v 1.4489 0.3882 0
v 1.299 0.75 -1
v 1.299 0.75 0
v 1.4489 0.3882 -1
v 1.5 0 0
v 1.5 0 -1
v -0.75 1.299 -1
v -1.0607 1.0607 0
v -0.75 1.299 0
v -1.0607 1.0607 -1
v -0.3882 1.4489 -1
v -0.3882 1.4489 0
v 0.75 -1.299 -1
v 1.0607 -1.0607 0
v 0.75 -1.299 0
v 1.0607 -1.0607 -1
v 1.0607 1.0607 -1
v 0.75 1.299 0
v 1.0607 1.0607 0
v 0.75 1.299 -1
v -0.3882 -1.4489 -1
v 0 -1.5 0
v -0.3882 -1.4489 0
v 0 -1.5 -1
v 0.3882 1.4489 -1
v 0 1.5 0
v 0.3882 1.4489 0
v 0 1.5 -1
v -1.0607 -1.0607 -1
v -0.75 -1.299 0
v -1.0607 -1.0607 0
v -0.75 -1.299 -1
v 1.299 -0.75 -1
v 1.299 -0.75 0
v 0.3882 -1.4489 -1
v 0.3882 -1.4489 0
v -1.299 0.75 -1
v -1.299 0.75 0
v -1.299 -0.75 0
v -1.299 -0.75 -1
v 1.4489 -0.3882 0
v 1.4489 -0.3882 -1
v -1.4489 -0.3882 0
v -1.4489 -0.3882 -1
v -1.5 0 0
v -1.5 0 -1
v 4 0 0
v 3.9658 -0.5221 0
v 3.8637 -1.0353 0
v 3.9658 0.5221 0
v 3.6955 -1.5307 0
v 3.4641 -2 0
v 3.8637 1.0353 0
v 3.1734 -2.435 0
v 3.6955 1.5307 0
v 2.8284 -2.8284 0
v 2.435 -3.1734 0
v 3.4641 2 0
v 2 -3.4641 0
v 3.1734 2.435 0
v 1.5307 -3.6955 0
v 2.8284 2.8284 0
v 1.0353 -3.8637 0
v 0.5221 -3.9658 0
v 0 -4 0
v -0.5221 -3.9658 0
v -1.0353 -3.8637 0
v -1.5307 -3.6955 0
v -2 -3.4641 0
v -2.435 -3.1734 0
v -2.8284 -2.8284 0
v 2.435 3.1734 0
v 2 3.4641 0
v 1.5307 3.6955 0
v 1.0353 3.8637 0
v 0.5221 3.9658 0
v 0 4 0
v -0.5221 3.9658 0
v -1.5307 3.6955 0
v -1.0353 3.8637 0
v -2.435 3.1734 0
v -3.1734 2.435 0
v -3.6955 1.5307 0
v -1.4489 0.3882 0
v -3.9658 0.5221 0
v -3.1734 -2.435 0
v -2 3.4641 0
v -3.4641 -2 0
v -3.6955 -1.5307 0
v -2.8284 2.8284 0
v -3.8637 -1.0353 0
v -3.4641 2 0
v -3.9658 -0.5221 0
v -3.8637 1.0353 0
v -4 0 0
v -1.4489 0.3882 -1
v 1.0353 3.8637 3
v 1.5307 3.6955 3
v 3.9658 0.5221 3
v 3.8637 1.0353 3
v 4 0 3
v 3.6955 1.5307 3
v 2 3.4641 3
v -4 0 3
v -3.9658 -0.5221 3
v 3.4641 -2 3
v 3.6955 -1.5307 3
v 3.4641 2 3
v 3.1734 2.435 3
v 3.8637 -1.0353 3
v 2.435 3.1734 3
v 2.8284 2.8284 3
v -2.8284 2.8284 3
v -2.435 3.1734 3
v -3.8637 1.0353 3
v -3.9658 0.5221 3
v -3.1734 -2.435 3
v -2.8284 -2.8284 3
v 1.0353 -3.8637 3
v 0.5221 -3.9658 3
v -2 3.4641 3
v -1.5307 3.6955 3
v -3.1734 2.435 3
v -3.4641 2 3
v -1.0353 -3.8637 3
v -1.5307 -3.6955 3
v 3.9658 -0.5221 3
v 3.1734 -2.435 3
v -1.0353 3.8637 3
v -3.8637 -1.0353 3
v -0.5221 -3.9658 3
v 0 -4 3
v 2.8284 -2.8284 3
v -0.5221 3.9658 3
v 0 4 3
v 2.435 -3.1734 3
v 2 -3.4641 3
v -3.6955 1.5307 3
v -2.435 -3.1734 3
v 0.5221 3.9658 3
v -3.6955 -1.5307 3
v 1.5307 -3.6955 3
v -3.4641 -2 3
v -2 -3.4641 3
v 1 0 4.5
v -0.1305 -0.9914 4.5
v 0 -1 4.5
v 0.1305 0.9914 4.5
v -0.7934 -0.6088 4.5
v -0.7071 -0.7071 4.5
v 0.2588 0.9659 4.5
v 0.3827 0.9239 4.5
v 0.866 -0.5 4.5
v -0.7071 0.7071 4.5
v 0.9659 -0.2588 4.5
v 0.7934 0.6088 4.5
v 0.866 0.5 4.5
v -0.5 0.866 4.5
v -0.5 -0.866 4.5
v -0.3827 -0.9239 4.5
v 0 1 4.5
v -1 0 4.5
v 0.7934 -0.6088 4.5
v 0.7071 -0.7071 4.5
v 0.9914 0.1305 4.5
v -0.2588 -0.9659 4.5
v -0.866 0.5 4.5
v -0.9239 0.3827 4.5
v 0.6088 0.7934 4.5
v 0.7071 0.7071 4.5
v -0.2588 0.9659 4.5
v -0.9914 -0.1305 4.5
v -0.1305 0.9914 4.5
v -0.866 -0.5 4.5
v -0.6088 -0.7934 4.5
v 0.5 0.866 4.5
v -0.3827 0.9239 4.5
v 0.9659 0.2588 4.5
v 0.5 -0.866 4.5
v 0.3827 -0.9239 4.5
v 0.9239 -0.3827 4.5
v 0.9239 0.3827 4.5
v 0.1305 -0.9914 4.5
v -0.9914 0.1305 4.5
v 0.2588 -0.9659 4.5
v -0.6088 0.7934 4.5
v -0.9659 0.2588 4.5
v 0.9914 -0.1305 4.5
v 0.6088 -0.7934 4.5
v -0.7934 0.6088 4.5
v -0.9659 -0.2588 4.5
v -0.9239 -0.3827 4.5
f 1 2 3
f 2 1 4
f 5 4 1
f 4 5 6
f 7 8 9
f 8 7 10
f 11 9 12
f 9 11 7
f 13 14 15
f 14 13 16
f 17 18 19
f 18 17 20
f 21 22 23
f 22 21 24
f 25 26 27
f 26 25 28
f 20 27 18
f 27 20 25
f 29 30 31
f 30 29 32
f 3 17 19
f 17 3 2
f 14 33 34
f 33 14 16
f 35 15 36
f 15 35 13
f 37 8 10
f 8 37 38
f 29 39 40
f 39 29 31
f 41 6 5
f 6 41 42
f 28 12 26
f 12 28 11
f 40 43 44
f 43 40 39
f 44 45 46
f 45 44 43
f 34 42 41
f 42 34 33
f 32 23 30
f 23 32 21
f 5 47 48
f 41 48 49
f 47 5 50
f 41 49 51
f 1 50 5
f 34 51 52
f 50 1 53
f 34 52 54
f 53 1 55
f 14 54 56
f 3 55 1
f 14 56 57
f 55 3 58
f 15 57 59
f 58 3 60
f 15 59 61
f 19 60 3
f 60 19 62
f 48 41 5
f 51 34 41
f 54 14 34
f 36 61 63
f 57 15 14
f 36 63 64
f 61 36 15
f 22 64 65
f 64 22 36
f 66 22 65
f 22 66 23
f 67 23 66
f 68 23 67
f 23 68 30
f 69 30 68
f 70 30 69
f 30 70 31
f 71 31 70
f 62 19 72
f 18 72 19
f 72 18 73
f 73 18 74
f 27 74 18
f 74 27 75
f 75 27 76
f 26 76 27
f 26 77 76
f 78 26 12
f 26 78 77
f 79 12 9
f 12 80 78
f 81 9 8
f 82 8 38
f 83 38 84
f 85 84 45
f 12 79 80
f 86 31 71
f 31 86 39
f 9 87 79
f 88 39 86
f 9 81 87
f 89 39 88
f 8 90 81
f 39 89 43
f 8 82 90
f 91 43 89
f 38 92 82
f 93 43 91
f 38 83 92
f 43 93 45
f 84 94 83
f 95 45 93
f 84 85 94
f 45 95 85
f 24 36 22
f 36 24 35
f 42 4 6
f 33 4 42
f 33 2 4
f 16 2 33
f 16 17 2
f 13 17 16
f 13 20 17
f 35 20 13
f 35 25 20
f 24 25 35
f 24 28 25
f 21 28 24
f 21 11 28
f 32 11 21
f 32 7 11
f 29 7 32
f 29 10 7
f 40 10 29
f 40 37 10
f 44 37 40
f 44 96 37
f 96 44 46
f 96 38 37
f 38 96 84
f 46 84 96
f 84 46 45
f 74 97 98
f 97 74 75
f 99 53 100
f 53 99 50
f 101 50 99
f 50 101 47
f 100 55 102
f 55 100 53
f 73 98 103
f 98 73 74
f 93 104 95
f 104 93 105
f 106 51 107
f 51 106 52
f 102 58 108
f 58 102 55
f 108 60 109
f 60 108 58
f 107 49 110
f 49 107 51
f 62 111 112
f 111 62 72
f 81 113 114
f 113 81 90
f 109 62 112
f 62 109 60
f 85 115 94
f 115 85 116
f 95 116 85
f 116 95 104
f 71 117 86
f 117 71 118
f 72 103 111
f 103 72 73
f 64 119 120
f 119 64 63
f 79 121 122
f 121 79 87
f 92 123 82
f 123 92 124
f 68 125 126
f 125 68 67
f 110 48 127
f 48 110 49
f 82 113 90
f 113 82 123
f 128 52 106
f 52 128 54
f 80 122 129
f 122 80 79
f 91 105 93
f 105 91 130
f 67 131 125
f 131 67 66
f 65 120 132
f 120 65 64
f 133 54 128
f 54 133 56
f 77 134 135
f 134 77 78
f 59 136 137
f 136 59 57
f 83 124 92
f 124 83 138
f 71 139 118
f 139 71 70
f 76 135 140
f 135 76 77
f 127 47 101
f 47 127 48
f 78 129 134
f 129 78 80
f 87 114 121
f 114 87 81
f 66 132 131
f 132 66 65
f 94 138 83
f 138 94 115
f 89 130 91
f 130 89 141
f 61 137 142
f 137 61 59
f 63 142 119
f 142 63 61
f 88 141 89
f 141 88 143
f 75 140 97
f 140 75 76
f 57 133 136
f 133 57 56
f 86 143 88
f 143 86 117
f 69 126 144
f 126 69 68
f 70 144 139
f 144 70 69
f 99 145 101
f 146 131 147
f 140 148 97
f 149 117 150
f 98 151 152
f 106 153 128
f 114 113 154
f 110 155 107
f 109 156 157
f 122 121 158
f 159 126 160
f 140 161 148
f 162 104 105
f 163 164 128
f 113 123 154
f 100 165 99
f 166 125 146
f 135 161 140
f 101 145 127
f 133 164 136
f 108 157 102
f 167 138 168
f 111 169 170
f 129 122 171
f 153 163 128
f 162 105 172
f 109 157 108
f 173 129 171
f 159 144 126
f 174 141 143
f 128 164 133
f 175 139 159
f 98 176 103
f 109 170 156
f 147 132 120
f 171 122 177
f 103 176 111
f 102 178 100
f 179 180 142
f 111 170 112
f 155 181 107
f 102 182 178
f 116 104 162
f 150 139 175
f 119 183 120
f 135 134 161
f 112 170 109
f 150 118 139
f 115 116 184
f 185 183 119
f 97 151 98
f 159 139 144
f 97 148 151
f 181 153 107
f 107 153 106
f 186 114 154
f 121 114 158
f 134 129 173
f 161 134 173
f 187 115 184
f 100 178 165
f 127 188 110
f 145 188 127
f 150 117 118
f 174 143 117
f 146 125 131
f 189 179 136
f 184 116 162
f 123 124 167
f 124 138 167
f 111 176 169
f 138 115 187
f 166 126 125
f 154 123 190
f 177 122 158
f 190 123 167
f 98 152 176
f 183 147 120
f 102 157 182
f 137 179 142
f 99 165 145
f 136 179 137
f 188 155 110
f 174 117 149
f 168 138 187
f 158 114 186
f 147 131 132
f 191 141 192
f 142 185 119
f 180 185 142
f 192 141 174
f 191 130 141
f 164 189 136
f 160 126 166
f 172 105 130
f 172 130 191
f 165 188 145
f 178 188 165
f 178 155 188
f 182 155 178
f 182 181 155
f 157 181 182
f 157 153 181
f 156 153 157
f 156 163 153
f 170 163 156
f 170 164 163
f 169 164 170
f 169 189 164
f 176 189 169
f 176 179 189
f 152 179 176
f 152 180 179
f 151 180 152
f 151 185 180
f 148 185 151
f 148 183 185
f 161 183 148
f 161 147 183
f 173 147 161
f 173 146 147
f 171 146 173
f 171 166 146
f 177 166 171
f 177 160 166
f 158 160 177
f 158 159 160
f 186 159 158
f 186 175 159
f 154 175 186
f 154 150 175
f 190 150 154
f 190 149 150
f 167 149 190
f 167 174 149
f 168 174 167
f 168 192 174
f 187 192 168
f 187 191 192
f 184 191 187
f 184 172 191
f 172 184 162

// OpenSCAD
// マジッククロス8シリーズ Jフック ライブラリ
//
// フィットチェック用モデルと取り付け穴モジュールを提供
// 賃貸でも使えるフック「マジッククロス8」シリーズのJフック用
//
// 依存: なし
//
// 設計上の注意:
// - このフックは3Dプリント構造を介して実際の壁に取り付ける想定
// - 3Dプリント構造: 本体を収める凹み + 針が通る貫通穴
// - 実際の壁: 構造の裏側、針が刺さる壁
// - 座標系は穴の向き（Z-方向に掘る）に合わせて設計
// - 構造の最小厚 = body_depth + needle_h

/* 寸法定数 */
j_hook_body_d = 8;           // メイン円柱直径
j_hook_body_h = 3;           // メイン円柱高さ
j_hook_cone_h = 1.5;         // 円錐高さ
j_hook_cone_top_d = 2;       // 円錐上面直径
j_hook_needle_d = 3;         // 針出口直径
j_hook_needle_h = 1;         // 針出口高さ（突出量）
j_hook_cover_thickness = 1;  // 純正カバーの厚さ（壁方向）
j_hook_cover_h = 5;          // 純正カバーの高さ（本体底面から）

/* 公差 */
// 3Dプリント公差: 水平面 0.3mm、垂直面 0.4-0.5mm 推奨
default_tolerance = 0.4;  // 垂直壁への穴を想定

// Jフックモデル（フィットチェック用）
//
// 原点: 本体底面中心（壁表面に接する面）
// Z+方向: 本体 → 円錐（部屋内側へ）
// Z-方向: 針出口（壁穴の中へ）
//
// 層構成:
//   Z=-1〜0: 針出口（壁穴に入る）
//   Z=0〜3: メイン円柱（壁表面から上）
//   Z=3〜4.5: 円錐
module magic_cross_8_j_hook() {
    color("LightGray") {
        // 底部針出口（壁穴に入る部分、Z-方向）
        translate([0, 0, -j_hook_needle_h])
            cylinder(h = j_hook_needle_h, d = j_hook_needle_d, $fn = 24);

        // メイン円柱
        cylinder(h = j_hook_body_h, d = j_hook_body_d, $fn = 48);

        // 上部円錐
        translate([0, 0, j_hook_body_h])
            cylinder(h = j_hook_cone_h,
                     d1 = j_hook_body_d,
                     d2 = j_hook_cone_top_d,
                     $fn = 48);
    }
}

// Jフック + カバー モデル（フィットチェック用）
//
// カバーは本体と円錐を覆う（高さ5mm、厚さ1mm）
module magic_cross_8_j_hook_with_cover() {
    // フック本体
    magic_cross_8_j_hook();

    // カバー（本体と円錐を覆う円筒）
    cover_d = j_hook_body_d + j_hook_cover_thickness * 2;
    color("White")
        difference() {
            cylinder(h = j_hook_cover_h, d = cover_d, $fn = 48);
            // 内側をくり抜き（フック本体が入る）
            translate([0, 0, -0.1])
                cylinder(h = j_hook_cover_h + 0.2, d = j_hook_body_d, $fn = 48);
        }
}

// Jフック用穴（取り付け穴）
//
// 原点: 壁表面（Z=0）、穴はZ-方向に掘られる
// body_depth: 本体埋め込み深さ（デフォルトは本体高さ）
// wall_thickness: 壁厚（針穴の貫通用）
// cover_thickness: カバー厚（0=カバーなし、1=純正カバー）
//
// 構造:
//   壁表面 → 本体用凹み(8mm or 10mm) → 針用穴(3mm) → 壁裏面
module magic_cross_8_j_hook_hole(
    tolerance = default_tolerance,
    body_depth = j_hook_body_h,
    wall_thickness = 5,
    cover_thickness = 0
) {
    // 凹みの直径（カバー厚を考慮）
    recess_d = j_hook_body_d + cover_thickness * 2 + tolerance * 2;

    // 本体埋め込み用凹み
    translate([0, 0, -body_depth - 0.1])
        cylinder(h = body_depth + 0.2,
                 d = recess_d,
                 $fn = 48);

    // 針出口用貫通穴
    translate([0, 0, -wall_thickness - 0.1])
        cylinder(h = wall_thickness + 0.2,
                 d = j_hook_needle_d + tolerance * 2,
                 $fn = 24);
}

// スタンドアロン実行時のプレビュー
// show_wall が未定義 = 単体で開いている
if (is_undef(show_wall)) {
    magic_cross_8_j_hook();
}
